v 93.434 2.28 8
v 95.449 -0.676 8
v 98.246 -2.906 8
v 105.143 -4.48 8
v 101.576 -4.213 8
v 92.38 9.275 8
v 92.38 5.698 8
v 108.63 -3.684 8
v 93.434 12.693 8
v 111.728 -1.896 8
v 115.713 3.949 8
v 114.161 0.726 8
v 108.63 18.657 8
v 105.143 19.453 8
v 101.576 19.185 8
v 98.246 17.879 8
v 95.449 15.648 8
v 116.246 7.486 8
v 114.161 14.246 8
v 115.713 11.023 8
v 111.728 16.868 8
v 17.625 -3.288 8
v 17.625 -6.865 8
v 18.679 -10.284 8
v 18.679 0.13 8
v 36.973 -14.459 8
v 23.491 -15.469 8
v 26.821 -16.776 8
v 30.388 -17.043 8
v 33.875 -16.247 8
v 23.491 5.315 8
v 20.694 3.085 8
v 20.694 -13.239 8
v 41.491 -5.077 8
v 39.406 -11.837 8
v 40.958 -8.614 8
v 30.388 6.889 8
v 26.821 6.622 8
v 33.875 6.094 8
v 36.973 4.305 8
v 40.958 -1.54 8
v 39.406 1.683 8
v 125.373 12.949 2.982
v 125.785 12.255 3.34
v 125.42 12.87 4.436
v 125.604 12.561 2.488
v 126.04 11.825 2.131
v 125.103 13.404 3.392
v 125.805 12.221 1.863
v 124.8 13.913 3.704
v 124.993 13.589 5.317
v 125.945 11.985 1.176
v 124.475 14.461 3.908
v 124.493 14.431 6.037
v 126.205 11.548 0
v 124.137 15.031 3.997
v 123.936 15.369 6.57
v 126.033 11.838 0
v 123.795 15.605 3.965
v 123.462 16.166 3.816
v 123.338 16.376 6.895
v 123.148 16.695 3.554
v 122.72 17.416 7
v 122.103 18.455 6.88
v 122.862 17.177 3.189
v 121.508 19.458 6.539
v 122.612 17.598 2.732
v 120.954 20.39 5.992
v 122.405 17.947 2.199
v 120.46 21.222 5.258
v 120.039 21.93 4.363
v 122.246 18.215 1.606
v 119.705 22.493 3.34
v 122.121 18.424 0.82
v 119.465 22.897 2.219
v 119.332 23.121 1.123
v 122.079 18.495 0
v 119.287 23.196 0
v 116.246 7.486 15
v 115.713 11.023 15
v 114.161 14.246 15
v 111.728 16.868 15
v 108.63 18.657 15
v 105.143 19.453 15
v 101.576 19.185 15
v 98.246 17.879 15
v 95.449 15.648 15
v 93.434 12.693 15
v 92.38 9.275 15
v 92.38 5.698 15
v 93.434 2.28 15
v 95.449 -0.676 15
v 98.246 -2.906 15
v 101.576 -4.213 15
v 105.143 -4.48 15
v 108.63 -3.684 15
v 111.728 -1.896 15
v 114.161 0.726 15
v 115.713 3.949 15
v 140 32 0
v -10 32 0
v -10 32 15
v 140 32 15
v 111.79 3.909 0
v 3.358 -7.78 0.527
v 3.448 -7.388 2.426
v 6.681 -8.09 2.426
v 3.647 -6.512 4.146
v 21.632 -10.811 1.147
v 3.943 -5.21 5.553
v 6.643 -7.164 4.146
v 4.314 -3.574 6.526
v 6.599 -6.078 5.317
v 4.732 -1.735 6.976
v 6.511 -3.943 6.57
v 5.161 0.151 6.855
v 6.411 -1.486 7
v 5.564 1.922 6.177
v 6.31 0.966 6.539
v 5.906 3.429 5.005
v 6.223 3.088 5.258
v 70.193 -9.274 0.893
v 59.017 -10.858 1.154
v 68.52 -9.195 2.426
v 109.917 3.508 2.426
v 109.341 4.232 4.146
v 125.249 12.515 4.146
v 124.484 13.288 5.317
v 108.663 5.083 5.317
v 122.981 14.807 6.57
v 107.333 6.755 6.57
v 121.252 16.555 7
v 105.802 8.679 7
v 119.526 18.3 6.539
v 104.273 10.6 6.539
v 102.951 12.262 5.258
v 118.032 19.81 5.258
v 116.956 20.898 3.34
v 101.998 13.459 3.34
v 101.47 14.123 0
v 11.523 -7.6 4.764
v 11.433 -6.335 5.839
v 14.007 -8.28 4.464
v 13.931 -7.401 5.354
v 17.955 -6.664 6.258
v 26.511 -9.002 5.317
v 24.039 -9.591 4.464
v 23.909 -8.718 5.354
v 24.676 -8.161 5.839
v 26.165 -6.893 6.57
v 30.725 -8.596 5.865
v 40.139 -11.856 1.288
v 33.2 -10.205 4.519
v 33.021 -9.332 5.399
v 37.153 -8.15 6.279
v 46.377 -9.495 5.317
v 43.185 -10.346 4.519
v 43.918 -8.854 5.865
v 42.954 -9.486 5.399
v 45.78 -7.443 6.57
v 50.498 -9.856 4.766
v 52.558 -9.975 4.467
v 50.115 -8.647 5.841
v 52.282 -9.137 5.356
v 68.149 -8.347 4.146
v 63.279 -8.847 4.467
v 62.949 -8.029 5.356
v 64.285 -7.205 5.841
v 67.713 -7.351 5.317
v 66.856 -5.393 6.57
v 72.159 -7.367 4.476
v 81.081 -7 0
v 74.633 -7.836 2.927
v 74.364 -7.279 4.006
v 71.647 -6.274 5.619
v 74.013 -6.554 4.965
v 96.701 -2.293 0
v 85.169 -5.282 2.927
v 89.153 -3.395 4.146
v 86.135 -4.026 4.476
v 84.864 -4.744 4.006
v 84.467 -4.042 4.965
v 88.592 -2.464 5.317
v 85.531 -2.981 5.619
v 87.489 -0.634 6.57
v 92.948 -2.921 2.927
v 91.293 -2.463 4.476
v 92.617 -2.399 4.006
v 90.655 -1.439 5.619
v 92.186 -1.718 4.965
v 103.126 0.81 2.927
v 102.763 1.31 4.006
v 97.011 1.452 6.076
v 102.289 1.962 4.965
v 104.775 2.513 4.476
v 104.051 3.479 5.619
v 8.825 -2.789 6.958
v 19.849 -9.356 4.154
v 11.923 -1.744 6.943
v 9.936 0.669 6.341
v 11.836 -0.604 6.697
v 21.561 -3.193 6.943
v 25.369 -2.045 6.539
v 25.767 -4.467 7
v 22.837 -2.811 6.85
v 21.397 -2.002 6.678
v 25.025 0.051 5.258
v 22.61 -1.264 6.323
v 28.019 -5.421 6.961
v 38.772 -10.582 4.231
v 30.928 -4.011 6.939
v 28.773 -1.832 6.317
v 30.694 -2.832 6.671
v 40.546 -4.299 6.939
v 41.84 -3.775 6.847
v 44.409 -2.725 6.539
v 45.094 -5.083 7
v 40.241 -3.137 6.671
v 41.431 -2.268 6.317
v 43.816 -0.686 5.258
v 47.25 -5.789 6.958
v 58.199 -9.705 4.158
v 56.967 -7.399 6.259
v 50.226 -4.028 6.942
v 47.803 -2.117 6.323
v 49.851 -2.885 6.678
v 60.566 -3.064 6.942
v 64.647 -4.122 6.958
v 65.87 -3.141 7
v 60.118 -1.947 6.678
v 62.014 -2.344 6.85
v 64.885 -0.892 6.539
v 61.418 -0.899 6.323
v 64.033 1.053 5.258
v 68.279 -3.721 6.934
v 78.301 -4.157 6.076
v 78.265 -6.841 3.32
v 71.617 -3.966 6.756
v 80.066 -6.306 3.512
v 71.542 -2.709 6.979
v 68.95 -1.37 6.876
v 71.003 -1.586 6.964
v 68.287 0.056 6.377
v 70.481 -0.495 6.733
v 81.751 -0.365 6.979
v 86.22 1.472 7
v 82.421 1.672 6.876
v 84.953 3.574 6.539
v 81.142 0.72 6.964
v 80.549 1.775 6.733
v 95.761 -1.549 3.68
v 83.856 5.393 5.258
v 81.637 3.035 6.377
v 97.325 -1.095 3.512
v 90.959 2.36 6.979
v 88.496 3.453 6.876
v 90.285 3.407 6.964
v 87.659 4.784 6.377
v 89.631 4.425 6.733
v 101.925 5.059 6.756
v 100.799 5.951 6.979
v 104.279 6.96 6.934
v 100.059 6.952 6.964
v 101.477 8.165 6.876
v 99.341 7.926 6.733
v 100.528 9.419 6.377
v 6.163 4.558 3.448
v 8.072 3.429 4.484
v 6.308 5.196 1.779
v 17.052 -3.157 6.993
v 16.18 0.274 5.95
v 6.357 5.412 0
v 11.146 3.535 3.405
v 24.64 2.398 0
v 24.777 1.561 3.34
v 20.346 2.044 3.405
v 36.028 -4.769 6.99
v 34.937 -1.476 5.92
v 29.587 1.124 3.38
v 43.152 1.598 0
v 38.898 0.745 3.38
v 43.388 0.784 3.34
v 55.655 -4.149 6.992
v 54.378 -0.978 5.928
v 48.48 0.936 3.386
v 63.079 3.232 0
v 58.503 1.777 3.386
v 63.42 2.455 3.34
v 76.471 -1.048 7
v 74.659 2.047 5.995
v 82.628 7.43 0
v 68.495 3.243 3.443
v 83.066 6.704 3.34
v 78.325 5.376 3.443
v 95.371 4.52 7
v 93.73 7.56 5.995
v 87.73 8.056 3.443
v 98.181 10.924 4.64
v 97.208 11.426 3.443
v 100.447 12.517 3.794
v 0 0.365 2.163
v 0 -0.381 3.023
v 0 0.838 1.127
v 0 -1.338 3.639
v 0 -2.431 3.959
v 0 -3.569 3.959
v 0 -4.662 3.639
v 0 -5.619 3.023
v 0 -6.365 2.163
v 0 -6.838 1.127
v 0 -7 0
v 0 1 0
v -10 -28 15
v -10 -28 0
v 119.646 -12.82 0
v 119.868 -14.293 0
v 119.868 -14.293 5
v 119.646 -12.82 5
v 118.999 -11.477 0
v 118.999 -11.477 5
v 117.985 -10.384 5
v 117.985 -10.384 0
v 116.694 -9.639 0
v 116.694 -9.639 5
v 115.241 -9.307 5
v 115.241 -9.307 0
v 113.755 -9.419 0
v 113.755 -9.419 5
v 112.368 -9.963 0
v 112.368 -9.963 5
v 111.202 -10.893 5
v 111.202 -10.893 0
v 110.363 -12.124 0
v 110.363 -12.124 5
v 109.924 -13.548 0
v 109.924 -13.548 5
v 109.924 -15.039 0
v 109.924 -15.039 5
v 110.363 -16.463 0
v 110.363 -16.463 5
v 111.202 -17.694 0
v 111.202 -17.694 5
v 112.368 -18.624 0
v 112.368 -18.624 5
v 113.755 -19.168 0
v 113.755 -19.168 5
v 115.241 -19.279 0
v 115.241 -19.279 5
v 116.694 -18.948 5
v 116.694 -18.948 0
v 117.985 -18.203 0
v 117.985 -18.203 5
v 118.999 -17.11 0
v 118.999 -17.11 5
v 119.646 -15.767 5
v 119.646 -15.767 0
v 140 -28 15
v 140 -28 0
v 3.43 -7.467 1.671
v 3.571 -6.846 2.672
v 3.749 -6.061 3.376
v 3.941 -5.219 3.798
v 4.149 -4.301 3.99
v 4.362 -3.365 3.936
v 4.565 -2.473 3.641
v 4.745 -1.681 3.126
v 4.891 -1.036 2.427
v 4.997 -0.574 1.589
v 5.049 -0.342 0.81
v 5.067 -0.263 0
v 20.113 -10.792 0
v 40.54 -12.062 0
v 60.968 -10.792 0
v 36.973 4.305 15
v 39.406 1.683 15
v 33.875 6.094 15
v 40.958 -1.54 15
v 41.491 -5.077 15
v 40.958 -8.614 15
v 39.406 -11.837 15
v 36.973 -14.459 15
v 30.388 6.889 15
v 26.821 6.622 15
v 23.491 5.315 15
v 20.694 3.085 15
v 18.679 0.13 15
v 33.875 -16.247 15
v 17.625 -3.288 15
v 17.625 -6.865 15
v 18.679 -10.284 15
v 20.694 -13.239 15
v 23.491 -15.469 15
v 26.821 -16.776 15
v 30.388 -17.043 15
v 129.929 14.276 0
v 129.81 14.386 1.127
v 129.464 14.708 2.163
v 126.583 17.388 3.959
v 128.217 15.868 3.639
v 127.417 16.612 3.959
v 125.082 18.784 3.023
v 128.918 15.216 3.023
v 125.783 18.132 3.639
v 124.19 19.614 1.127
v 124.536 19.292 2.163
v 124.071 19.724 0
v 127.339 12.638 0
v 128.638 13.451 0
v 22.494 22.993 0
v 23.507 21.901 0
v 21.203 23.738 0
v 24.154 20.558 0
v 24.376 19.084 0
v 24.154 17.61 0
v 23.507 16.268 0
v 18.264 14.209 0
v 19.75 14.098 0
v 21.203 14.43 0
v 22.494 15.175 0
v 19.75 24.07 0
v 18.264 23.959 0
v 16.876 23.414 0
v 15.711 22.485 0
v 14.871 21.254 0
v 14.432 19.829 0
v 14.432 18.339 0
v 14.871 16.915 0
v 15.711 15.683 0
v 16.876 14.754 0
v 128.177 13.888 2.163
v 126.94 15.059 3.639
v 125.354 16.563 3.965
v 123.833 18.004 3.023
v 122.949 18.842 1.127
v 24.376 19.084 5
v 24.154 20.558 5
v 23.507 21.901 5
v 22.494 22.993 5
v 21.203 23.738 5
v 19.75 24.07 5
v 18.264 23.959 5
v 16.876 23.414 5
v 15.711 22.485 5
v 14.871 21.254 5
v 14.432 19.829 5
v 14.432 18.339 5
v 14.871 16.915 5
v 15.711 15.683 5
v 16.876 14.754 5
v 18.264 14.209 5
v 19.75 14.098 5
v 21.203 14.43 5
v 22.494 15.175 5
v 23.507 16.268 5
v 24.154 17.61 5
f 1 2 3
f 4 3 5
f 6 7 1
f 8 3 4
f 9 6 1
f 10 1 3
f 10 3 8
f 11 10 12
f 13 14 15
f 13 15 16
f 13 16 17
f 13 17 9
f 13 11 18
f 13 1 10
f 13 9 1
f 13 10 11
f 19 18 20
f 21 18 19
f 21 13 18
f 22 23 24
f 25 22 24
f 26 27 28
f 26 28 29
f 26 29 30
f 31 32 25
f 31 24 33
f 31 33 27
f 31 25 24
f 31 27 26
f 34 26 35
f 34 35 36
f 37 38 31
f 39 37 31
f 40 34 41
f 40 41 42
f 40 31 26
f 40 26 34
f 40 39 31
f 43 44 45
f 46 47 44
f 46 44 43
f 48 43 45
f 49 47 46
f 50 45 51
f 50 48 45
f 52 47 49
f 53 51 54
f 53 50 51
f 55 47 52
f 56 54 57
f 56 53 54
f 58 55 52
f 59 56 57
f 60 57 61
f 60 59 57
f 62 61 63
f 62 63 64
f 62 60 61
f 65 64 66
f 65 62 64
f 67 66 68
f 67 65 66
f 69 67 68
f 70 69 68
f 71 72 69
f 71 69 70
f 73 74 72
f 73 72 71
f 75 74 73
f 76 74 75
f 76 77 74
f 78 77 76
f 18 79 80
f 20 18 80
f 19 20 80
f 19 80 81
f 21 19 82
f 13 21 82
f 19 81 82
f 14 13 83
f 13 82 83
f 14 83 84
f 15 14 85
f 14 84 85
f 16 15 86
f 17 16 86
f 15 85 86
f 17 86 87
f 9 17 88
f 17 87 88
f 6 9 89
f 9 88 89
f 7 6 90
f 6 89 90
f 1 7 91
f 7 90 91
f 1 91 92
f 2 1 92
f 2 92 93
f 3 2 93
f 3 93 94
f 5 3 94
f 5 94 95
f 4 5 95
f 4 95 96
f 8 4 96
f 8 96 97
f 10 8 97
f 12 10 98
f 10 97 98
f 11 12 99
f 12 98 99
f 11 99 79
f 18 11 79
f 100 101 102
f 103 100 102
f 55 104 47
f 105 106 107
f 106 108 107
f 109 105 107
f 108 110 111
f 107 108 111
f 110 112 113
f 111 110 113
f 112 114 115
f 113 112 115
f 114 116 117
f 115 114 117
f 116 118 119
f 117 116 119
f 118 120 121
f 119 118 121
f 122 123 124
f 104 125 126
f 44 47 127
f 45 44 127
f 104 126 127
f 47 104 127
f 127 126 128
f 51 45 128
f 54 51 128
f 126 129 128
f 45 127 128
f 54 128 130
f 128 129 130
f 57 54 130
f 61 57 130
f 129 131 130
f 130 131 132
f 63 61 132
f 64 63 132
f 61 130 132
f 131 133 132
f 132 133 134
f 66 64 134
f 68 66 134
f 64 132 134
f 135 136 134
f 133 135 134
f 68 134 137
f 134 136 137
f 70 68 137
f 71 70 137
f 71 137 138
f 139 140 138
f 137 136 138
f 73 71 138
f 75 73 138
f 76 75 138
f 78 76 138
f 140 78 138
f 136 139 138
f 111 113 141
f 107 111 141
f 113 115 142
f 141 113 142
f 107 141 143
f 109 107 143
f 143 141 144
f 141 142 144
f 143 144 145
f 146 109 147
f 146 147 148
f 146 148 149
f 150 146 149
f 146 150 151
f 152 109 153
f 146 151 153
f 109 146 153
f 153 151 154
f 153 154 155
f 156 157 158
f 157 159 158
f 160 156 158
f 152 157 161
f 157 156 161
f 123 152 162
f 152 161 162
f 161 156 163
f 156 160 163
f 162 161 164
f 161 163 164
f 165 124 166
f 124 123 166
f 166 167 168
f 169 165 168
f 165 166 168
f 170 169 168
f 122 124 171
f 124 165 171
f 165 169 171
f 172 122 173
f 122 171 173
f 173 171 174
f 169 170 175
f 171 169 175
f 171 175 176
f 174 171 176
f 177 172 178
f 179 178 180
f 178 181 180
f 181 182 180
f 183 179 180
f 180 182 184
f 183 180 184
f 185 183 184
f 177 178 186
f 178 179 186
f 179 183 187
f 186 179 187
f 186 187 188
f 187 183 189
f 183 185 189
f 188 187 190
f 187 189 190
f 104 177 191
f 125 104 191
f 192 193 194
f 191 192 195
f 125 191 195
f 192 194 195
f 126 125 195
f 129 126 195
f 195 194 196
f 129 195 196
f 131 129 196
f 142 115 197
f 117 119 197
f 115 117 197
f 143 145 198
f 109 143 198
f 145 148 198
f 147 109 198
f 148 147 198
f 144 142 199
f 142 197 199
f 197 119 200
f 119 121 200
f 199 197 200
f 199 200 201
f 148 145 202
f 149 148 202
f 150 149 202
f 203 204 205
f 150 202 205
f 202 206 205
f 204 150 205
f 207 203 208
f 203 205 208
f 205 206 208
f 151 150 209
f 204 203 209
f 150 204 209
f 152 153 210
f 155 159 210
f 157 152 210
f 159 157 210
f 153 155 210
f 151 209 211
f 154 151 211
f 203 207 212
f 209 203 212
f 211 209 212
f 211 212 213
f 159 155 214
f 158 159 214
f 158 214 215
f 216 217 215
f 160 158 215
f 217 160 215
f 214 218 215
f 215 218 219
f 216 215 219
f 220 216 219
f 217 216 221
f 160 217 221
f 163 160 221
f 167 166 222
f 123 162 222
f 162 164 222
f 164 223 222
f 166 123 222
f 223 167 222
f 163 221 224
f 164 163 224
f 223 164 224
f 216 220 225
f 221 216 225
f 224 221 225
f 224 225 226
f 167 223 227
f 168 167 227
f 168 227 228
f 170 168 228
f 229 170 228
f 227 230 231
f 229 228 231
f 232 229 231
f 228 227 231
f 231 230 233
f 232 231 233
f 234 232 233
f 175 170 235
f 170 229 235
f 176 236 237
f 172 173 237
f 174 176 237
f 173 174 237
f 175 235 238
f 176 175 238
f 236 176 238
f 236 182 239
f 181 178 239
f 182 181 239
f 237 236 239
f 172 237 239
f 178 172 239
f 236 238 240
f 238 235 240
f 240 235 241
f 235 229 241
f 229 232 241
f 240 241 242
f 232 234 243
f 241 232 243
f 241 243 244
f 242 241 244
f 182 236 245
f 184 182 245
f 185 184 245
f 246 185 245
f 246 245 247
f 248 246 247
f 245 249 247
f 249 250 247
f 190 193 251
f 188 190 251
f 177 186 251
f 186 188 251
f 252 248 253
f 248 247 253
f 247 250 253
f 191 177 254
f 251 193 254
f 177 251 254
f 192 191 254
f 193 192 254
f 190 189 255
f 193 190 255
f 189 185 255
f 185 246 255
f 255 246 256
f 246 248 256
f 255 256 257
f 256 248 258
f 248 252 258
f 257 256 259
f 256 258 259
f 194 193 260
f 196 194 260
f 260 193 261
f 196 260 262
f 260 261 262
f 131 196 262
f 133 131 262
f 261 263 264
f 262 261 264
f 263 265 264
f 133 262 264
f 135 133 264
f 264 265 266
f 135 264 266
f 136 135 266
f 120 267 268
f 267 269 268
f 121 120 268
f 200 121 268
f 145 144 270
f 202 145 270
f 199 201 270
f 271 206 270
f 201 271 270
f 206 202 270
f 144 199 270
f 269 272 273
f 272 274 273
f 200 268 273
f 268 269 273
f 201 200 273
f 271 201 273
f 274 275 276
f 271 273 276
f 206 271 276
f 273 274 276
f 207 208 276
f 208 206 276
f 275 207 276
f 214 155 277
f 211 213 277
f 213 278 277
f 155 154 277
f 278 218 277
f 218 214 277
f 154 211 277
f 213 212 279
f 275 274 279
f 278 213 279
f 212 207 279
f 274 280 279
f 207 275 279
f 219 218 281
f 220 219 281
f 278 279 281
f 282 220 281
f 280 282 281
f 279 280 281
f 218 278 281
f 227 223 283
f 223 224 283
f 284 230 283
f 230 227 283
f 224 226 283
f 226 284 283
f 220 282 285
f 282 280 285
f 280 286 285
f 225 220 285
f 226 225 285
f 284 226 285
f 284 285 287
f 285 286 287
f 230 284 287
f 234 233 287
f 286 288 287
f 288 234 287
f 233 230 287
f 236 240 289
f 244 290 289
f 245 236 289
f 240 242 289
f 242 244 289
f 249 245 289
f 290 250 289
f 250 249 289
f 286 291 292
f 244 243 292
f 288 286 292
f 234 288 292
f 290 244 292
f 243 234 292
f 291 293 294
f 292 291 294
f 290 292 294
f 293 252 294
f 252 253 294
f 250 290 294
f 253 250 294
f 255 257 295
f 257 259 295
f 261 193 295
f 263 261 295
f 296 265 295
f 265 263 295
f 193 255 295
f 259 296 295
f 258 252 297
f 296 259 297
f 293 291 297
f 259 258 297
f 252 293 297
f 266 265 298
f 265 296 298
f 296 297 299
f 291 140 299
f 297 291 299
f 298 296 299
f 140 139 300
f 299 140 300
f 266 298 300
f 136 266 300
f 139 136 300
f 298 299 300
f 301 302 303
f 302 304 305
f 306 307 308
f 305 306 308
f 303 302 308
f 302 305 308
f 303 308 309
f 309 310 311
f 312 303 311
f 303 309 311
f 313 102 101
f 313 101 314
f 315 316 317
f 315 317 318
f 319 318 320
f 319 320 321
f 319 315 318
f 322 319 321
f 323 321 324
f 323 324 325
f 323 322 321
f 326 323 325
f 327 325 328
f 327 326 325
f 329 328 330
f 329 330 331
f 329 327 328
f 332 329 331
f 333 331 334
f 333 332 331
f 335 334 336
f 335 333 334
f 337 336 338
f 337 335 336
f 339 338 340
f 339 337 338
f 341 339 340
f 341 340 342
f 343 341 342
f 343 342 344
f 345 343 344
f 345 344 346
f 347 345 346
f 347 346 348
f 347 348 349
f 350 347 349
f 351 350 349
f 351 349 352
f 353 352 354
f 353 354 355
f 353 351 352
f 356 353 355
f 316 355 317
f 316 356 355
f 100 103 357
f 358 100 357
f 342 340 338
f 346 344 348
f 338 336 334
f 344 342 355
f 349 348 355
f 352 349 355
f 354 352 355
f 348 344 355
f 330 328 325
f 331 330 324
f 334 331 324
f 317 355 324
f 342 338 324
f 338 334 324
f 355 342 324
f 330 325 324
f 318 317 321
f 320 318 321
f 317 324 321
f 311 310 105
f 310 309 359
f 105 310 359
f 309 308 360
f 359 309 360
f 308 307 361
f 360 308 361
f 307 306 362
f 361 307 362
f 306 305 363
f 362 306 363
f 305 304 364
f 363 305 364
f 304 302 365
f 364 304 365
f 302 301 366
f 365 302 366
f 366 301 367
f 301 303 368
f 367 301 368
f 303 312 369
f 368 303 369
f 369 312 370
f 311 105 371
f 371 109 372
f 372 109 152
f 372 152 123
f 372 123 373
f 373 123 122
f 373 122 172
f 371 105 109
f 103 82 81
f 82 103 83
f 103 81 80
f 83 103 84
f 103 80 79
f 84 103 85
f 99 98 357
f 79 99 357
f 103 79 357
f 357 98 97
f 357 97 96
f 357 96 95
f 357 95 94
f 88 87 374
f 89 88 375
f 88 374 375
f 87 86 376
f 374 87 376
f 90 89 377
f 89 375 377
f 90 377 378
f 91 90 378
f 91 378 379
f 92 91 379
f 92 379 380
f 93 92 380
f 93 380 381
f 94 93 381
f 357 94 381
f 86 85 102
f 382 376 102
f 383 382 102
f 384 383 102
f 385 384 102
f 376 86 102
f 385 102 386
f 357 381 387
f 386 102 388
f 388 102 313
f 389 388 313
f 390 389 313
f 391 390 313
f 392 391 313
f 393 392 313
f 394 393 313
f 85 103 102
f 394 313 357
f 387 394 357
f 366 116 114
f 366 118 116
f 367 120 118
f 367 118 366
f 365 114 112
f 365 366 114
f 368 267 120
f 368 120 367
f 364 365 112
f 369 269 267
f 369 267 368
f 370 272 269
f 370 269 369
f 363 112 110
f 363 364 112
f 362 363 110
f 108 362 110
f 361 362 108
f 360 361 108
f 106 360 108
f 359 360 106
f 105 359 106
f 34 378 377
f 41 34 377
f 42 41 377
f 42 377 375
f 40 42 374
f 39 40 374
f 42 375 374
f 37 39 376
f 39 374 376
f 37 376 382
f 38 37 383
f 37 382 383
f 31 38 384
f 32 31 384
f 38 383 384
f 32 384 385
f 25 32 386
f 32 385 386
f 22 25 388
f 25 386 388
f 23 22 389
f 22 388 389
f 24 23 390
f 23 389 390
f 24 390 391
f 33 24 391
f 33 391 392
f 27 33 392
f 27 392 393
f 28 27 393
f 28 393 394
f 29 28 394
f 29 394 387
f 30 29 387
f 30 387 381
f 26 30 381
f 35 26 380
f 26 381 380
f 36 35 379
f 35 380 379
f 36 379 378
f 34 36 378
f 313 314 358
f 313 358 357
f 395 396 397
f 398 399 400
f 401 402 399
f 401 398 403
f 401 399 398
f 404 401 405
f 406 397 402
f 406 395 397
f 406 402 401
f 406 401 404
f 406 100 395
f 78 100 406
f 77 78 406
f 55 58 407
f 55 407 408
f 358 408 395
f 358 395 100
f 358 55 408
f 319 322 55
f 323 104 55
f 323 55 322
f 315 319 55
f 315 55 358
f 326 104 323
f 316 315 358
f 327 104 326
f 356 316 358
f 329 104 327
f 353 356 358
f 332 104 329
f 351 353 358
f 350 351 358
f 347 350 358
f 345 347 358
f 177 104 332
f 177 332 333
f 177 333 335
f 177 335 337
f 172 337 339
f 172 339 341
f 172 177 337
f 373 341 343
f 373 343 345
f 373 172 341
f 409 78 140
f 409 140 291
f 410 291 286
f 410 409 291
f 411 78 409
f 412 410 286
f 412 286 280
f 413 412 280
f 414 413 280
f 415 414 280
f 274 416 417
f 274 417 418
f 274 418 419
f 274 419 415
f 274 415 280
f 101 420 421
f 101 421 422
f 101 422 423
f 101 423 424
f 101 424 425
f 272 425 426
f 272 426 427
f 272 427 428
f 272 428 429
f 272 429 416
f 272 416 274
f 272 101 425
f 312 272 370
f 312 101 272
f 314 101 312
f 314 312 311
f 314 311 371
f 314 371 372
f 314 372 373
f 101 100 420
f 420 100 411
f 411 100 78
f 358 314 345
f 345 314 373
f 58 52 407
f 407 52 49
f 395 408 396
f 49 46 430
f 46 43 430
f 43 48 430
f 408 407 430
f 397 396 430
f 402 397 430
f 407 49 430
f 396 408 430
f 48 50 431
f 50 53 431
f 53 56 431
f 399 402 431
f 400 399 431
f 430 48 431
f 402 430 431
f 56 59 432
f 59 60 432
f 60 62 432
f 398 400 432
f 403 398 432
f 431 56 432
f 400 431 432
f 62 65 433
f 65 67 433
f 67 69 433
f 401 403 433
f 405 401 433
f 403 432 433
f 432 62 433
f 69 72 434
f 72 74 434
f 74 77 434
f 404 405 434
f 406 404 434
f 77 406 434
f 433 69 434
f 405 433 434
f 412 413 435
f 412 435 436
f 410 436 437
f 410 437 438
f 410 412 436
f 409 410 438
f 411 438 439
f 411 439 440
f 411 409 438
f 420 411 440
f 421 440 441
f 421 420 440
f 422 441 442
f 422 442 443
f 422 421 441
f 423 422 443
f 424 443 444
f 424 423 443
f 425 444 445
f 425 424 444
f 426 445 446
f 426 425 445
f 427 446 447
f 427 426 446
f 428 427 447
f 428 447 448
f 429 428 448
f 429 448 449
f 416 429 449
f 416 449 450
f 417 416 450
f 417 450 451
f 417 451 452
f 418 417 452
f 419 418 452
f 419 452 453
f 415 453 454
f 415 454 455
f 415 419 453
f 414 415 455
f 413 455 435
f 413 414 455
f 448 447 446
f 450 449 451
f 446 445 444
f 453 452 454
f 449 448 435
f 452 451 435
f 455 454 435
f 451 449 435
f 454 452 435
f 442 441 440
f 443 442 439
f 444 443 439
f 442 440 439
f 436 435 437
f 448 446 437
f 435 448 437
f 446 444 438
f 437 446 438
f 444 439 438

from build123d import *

# Parameters (mm, degrees)
SKETCH047_R      = 5
EXTRUDE030_DEPTH = 5
SKETCH045_R      = 12
EXTRUDE028_DEPTH = 7
SKETCH042_R      = 4
EXTRUDE025_DEPTH = 30
SKETCH040_R      = 7
SKETCH043_W      = 60
SKETCH043_H      = 15
EXTRUDE026_DEPTH = 150


with BuildPart() as extrude030:
    # Sketch047 → Extrude030 (new body)
    with BuildSketch(Plane.XY):
        with Locations((19.376185, 19.084115)):
            Circle(SKETCH047_R)
        with Locations((114.867691, -14.293477)):
            Circle(SKETCH047_R)
    extrude(amount=EXTRUDE030_DEPTH)


with BuildPart() as sprue_and_vent001:
    # Sketch045 → Extrude028 (new body)
    with BuildSketch(Plane.XY.offset(15)):
        with Locations((29.491073, -5.076964)):
            Circle(SKETCH045_R)
        with Locations((104.246048, 7.486251)):
            Circle(SKETCH045_R)
    extrude(amount=-EXTRUDE028_DEPTH)


with BuildPart() as sweep012:
    # Sweep012: sweep along a path in Sketch
    with BuildLine(Plane.XY) as sweep012_path:
        ThreePointArc((0, 0), (65.583227, -3.22849), (127, 20))
    # Sketch042 → Sweep012 (sweep)
    with BuildSketch(Plane(origin=(0, 0, 0), x_dir=(0, -1, 0), z_dir=(-1, 0, 0))):
        Circle(SKETCH042_R)
    sweep(path=sweep012_path.line)


with BuildPart() as sweep012_1:
    # Sweep012 placement: moved
    add(sweep012.part.moved(Location((0, -3, 0))))


with BuildPart() as extrude025:
    # Sketch041 → Extrude025 (new body)
    with BuildSketch(Plane.XY.offset(-15)):
        Polygon((-8.268976, 21.973037), (10.121624, 21.973037), (-0.555824, -25), (-25.401805, -25), align=None)
        Polygon((105.81268, 45.885295), (155.276998, 45.885295), (207.473539, -4.114705), (135.506671, -4.114705), align=None)
    extrude(amount=EXTRUDE025_DEPTH)


with BuildPart() as fusion012:
    # Sweep009: sweep along a path in Sketch
    with BuildLine(Plane.XY) as sweep009_path:
        ThreePointArc((0, 0), (65.583227, -3.22849), (127, 20))
    # Sketch040 → Sweep009 (sweep)
    with BuildSketch(Plane(origin=(0, 0, 0), x_dir=(0, -1, 0), z_dir=(-1, 0, 0))):
        Circle(SKETCH040_R)
    sweep(path=sweep009_path.line)

    # Cut011: cut Extrude025
    add(extrude025.part, mode=Mode.SUBTRACT)

    # Fusion011: union Sweep012
    add(sweep012_1.part)

    # Fusion012: union Sprue and Vent001
    add(sprue_and_vent001.part)


with BuildPart() as motor_mold_top:
    # Sketch043 → Extrude026 (new body)
    with BuildSketch(Plane(origin=(-10, 0, 0), x_dir=(0, -1, 0), z_dir=(-1, 0, 0))):
        with Locations((-2, 7.5)):
            Rectangle(SKETCH043_W, SKETCH043_H)
    extrude(amount=-EXTRUDE026_DEPTH)

    # Cut012: cut Fusion012
    add(fusion012.part, mode=Mode.SUBTRACT)

    # Cut014: cut Extrude030
    add(extrude030.part, mode=Mode.SUBTRACT)


solid = motor_mold_top.part
